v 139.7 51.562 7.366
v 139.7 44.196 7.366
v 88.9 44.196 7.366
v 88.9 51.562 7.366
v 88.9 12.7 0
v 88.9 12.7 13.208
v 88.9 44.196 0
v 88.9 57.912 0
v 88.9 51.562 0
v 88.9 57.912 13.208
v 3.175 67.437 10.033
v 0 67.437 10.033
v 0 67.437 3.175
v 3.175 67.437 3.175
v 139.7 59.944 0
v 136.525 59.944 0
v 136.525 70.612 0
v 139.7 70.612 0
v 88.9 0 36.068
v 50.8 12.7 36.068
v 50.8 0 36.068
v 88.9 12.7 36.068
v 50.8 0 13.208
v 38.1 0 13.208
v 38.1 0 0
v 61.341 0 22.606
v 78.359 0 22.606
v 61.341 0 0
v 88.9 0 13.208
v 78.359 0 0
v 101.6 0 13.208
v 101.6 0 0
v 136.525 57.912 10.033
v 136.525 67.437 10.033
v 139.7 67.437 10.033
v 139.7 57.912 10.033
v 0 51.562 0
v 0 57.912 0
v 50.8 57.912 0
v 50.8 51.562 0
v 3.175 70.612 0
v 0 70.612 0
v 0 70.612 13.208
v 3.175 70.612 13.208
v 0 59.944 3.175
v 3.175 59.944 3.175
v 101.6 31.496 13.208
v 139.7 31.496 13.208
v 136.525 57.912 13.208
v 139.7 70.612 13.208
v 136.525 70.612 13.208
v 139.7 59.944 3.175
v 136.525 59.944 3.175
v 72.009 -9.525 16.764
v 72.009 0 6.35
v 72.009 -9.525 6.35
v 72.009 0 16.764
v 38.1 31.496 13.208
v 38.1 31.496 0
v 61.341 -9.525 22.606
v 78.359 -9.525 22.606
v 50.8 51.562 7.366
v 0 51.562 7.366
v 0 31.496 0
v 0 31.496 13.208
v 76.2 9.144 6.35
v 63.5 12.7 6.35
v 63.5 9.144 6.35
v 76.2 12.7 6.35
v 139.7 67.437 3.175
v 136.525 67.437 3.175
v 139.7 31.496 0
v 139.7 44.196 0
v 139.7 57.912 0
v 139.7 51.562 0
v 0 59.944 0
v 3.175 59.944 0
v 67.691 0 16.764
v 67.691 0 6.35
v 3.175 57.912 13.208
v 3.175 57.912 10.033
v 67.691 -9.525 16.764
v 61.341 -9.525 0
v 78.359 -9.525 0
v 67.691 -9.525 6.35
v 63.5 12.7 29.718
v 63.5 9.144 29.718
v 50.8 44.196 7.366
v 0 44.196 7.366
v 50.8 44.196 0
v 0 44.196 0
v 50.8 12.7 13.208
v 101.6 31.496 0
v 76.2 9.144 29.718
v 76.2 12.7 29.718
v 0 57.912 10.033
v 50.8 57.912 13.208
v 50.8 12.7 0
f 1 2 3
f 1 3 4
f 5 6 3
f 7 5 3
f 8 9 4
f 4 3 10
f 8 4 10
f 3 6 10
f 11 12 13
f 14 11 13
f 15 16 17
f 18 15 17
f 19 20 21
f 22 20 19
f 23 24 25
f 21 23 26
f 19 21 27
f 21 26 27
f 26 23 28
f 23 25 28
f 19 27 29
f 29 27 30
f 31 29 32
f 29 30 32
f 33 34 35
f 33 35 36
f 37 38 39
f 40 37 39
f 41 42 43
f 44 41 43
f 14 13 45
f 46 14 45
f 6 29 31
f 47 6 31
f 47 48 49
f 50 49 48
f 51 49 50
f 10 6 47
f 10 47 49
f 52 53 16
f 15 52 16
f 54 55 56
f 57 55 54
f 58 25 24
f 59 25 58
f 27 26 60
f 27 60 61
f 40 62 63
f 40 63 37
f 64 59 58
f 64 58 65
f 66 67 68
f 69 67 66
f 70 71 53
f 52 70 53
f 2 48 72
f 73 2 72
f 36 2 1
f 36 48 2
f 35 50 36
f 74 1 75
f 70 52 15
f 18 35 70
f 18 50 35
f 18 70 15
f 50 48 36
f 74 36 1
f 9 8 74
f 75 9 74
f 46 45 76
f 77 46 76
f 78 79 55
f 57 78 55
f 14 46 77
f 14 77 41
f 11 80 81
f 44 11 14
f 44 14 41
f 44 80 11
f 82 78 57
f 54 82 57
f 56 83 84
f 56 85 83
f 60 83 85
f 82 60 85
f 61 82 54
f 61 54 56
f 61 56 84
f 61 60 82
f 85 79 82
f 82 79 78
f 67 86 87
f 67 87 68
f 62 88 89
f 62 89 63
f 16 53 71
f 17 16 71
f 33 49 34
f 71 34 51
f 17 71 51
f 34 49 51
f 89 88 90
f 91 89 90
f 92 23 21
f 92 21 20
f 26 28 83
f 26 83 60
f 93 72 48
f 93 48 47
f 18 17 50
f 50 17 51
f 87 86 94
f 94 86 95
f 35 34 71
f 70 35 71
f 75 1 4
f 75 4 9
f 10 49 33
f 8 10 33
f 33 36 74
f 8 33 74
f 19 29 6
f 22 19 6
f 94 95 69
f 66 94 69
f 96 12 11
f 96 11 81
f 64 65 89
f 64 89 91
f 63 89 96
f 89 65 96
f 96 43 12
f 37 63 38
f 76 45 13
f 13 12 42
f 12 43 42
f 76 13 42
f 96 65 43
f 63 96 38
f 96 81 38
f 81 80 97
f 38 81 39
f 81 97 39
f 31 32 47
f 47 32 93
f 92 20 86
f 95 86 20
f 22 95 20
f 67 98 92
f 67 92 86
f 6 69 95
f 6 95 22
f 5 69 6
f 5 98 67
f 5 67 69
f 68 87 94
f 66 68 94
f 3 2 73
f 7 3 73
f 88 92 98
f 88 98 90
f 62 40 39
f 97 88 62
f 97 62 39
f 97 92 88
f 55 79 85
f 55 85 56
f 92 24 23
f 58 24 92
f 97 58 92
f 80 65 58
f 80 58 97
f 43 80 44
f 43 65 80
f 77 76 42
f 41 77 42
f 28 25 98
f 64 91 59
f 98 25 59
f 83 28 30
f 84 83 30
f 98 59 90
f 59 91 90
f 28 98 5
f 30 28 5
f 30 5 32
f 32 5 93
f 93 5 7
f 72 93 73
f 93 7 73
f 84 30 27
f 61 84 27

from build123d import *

# Parameters (mm, degrees)
SKETCH1_W           = 139.7
SKETCH1_H           = 66.04
BOSS_EXTRUDE1_DEPTH = 13.208
SKETCH2_W           = 38.1
SKETCH2_H           = 53.34
CUT_EXTRUDE1_DEPTH  = 13.208
SKETCH3_W           = 38.1
SKETCH3_H           = 12.7
BOSS_EXTRUDE2_DEPTH = 31.242
SKETCH4_W           = 12.7
SKETCH4_H           = 23.368
CUT_EXTRUDE2_DEPTH  = 3.556
SKETCH5_W           = 17.018
SKETCH5_H           = 22.606
SKETCH5_W_2         = 4.318
SKETCH5_H_2         = 10.414
BOSS_EXTRUDE3_DEPTH = 9.525
SKETCH6_W           = 7.366
SKETCH6_H           = 7.366
SKETCH6_W_2         = 13.208
SKETCH6_H_2         = 8.128
CUT_EXTRUDE3_DEPTH  = 172.847
BOSS_EXTRUDE4_DEPTH = 139.7
SKETCH8_W           = 133.35
SKETCH8_H           = 12.7
CUT_EXTRUDE4_DEPTH  = 139.7
SKETCH9_W           = 38.1
SKETCH9_H           = 31.496
CUT_EXTRUDE5_DEPTH  = 139.7
SKETCH10_W          = 38.1
SKETCH10_H          = 8.382
CUT_EXTRUDE6_DEPTH  = 139.7


with BuildPart() as part:
    # Sketch1 → Boss-Extrude1 (new body)
    with BuildSketch(Plane.XY):
        with Locations((69.85, 33.02)):
            Rectangle(SKETCH1_W, SKETCH1_H)
    extrude(amount=BOSS_EXTRUDE1_DEPTH)

    # Sketch2 → Cut-Extrude1 (cut)
    with BuildSketch(Plane.XY.offset(13.208)):
        with Locations((69.85, 39.37)):
            Rectangle(SKETCH2_W, SKETCH2_H)
    extrude(amount=-CUT_EXTRUDE1_DEPTH, mode=Mode.SUBTRACT)

    # Sketch3 → Boss-Extrude2 (add)
    with BuildSketch(Plane.XY.offset(13.208)):
        with Locations((69.85, 6.35)):
            Rectangle(SKETCH3_W, SKETCH3_H)
    extrude(amount=BOSS_EXTRUDE2_DEPTH)

    # Sketch4 → Cut-Extrude2 (cut)
    with BuildSketch(Plane(origin=(0, 12.7, 0), x_dir=(1, 0, 0), z_dir=(0, 1, 0))):
        with Locations((69.85, -18.034)):
            Rectangle(SKETCH4_W, SKETCH4_H)
    extrude(amount=-CUT_EXTRUDE2_DEPTH, mode=Mode.SUBTRACT)

    # Sketch5 → Boss-Extrude3 (add)
    with BuildSketch(Plane.XZ):
        with Locations((69.85, 11.303)):
            Rectangle(SKETCH5_W, SKETCH5_H)
        with Locations((69.85, 11.557)):
            Rectangle(SKETCH5_W_2, SKETCH5_H_2, mode=Mode.SUBTRACT)
    extrude(amount=BOSS_EXTRUDE3_DEPTH)

    # Sketch6 → Cut-Extrude3 (cut)
    with BuildSketch(Plane(origin=(139.7, 0, 0), x_dir=(0, 0, -1), z_dir=(1, 0, 0))):
        with Locations((-3.683, 47.879)):
            Rectangle(SKETCH6_W, SKETCH6_H)
        with Locations((-6.604, 61.976)):
            Rectangle(SKETCH6_W_2, SKETCH6_H_2)
    extrude(amount=-CUT_EXTRUDE3_DEPTH, mode=Mode.SUBTRACT)

    # Sketch7 → Boss-Extrude4 (add)
    with BuildSketch(Plane.ZY):
        Polygon((0, 59.944), (0, 70.612), (13.208, 70.612), (13.208, 59.944), (13.208, 57.912), (10.033, 57.912), (10.033, 59.944), (10.033, 67.437), (3.175, 67.437), (3.175, 59.944), align=None)
    extrude(amount=-BOSS_EXTRUDE4_DEPTH)

    # Sketch8 → Cut-Extrude4 (cut)
    with BuildSketch(Plane.XY.offset(13.208)):
        with Locations((69.85, 64.262)):
            Rectangle(SKETCH8_W, SKETCH8_H)
    extrude(amount=-CUT_EXTRUDE4_DEPTH, mode=Mode.SUBTRACT)

    # Sketch9 → Cut-Extrude5 (cut)
    with BuildSketch(Plane(origin=(0, 0, 0), x_dir=(-1, 0, 0), z_dir=(0, 0, -1))):
        with Locations((-120.65, 15.748)):
            Rectangle(SKETCH9_W, SKETCH9_H)
        with Locations((-19.05, 15.748)):
            Rectangle(SKETCH9_W, SKETCH9_H)
    extrude(amount=-CUT_EXTRUDE5_DEPTH, mode=Mode.SUBTRACT)

    # Sketch10 → Cut-Extrude6 (cut)
    with BuildSketch(Plane(origin=(0, 12.7, 0), x_dir=(1, 0, 0), z_dir=(0, 1, 0))):
        with Locations((69.85, -40.259)):
            Rectangle(SKETCH10_W, SKETCH10_H)
    extrude(amount=-CUT_EXTRUDE6_DEPTH, mode=Mode.SUBTRACT)


solid = part.part
